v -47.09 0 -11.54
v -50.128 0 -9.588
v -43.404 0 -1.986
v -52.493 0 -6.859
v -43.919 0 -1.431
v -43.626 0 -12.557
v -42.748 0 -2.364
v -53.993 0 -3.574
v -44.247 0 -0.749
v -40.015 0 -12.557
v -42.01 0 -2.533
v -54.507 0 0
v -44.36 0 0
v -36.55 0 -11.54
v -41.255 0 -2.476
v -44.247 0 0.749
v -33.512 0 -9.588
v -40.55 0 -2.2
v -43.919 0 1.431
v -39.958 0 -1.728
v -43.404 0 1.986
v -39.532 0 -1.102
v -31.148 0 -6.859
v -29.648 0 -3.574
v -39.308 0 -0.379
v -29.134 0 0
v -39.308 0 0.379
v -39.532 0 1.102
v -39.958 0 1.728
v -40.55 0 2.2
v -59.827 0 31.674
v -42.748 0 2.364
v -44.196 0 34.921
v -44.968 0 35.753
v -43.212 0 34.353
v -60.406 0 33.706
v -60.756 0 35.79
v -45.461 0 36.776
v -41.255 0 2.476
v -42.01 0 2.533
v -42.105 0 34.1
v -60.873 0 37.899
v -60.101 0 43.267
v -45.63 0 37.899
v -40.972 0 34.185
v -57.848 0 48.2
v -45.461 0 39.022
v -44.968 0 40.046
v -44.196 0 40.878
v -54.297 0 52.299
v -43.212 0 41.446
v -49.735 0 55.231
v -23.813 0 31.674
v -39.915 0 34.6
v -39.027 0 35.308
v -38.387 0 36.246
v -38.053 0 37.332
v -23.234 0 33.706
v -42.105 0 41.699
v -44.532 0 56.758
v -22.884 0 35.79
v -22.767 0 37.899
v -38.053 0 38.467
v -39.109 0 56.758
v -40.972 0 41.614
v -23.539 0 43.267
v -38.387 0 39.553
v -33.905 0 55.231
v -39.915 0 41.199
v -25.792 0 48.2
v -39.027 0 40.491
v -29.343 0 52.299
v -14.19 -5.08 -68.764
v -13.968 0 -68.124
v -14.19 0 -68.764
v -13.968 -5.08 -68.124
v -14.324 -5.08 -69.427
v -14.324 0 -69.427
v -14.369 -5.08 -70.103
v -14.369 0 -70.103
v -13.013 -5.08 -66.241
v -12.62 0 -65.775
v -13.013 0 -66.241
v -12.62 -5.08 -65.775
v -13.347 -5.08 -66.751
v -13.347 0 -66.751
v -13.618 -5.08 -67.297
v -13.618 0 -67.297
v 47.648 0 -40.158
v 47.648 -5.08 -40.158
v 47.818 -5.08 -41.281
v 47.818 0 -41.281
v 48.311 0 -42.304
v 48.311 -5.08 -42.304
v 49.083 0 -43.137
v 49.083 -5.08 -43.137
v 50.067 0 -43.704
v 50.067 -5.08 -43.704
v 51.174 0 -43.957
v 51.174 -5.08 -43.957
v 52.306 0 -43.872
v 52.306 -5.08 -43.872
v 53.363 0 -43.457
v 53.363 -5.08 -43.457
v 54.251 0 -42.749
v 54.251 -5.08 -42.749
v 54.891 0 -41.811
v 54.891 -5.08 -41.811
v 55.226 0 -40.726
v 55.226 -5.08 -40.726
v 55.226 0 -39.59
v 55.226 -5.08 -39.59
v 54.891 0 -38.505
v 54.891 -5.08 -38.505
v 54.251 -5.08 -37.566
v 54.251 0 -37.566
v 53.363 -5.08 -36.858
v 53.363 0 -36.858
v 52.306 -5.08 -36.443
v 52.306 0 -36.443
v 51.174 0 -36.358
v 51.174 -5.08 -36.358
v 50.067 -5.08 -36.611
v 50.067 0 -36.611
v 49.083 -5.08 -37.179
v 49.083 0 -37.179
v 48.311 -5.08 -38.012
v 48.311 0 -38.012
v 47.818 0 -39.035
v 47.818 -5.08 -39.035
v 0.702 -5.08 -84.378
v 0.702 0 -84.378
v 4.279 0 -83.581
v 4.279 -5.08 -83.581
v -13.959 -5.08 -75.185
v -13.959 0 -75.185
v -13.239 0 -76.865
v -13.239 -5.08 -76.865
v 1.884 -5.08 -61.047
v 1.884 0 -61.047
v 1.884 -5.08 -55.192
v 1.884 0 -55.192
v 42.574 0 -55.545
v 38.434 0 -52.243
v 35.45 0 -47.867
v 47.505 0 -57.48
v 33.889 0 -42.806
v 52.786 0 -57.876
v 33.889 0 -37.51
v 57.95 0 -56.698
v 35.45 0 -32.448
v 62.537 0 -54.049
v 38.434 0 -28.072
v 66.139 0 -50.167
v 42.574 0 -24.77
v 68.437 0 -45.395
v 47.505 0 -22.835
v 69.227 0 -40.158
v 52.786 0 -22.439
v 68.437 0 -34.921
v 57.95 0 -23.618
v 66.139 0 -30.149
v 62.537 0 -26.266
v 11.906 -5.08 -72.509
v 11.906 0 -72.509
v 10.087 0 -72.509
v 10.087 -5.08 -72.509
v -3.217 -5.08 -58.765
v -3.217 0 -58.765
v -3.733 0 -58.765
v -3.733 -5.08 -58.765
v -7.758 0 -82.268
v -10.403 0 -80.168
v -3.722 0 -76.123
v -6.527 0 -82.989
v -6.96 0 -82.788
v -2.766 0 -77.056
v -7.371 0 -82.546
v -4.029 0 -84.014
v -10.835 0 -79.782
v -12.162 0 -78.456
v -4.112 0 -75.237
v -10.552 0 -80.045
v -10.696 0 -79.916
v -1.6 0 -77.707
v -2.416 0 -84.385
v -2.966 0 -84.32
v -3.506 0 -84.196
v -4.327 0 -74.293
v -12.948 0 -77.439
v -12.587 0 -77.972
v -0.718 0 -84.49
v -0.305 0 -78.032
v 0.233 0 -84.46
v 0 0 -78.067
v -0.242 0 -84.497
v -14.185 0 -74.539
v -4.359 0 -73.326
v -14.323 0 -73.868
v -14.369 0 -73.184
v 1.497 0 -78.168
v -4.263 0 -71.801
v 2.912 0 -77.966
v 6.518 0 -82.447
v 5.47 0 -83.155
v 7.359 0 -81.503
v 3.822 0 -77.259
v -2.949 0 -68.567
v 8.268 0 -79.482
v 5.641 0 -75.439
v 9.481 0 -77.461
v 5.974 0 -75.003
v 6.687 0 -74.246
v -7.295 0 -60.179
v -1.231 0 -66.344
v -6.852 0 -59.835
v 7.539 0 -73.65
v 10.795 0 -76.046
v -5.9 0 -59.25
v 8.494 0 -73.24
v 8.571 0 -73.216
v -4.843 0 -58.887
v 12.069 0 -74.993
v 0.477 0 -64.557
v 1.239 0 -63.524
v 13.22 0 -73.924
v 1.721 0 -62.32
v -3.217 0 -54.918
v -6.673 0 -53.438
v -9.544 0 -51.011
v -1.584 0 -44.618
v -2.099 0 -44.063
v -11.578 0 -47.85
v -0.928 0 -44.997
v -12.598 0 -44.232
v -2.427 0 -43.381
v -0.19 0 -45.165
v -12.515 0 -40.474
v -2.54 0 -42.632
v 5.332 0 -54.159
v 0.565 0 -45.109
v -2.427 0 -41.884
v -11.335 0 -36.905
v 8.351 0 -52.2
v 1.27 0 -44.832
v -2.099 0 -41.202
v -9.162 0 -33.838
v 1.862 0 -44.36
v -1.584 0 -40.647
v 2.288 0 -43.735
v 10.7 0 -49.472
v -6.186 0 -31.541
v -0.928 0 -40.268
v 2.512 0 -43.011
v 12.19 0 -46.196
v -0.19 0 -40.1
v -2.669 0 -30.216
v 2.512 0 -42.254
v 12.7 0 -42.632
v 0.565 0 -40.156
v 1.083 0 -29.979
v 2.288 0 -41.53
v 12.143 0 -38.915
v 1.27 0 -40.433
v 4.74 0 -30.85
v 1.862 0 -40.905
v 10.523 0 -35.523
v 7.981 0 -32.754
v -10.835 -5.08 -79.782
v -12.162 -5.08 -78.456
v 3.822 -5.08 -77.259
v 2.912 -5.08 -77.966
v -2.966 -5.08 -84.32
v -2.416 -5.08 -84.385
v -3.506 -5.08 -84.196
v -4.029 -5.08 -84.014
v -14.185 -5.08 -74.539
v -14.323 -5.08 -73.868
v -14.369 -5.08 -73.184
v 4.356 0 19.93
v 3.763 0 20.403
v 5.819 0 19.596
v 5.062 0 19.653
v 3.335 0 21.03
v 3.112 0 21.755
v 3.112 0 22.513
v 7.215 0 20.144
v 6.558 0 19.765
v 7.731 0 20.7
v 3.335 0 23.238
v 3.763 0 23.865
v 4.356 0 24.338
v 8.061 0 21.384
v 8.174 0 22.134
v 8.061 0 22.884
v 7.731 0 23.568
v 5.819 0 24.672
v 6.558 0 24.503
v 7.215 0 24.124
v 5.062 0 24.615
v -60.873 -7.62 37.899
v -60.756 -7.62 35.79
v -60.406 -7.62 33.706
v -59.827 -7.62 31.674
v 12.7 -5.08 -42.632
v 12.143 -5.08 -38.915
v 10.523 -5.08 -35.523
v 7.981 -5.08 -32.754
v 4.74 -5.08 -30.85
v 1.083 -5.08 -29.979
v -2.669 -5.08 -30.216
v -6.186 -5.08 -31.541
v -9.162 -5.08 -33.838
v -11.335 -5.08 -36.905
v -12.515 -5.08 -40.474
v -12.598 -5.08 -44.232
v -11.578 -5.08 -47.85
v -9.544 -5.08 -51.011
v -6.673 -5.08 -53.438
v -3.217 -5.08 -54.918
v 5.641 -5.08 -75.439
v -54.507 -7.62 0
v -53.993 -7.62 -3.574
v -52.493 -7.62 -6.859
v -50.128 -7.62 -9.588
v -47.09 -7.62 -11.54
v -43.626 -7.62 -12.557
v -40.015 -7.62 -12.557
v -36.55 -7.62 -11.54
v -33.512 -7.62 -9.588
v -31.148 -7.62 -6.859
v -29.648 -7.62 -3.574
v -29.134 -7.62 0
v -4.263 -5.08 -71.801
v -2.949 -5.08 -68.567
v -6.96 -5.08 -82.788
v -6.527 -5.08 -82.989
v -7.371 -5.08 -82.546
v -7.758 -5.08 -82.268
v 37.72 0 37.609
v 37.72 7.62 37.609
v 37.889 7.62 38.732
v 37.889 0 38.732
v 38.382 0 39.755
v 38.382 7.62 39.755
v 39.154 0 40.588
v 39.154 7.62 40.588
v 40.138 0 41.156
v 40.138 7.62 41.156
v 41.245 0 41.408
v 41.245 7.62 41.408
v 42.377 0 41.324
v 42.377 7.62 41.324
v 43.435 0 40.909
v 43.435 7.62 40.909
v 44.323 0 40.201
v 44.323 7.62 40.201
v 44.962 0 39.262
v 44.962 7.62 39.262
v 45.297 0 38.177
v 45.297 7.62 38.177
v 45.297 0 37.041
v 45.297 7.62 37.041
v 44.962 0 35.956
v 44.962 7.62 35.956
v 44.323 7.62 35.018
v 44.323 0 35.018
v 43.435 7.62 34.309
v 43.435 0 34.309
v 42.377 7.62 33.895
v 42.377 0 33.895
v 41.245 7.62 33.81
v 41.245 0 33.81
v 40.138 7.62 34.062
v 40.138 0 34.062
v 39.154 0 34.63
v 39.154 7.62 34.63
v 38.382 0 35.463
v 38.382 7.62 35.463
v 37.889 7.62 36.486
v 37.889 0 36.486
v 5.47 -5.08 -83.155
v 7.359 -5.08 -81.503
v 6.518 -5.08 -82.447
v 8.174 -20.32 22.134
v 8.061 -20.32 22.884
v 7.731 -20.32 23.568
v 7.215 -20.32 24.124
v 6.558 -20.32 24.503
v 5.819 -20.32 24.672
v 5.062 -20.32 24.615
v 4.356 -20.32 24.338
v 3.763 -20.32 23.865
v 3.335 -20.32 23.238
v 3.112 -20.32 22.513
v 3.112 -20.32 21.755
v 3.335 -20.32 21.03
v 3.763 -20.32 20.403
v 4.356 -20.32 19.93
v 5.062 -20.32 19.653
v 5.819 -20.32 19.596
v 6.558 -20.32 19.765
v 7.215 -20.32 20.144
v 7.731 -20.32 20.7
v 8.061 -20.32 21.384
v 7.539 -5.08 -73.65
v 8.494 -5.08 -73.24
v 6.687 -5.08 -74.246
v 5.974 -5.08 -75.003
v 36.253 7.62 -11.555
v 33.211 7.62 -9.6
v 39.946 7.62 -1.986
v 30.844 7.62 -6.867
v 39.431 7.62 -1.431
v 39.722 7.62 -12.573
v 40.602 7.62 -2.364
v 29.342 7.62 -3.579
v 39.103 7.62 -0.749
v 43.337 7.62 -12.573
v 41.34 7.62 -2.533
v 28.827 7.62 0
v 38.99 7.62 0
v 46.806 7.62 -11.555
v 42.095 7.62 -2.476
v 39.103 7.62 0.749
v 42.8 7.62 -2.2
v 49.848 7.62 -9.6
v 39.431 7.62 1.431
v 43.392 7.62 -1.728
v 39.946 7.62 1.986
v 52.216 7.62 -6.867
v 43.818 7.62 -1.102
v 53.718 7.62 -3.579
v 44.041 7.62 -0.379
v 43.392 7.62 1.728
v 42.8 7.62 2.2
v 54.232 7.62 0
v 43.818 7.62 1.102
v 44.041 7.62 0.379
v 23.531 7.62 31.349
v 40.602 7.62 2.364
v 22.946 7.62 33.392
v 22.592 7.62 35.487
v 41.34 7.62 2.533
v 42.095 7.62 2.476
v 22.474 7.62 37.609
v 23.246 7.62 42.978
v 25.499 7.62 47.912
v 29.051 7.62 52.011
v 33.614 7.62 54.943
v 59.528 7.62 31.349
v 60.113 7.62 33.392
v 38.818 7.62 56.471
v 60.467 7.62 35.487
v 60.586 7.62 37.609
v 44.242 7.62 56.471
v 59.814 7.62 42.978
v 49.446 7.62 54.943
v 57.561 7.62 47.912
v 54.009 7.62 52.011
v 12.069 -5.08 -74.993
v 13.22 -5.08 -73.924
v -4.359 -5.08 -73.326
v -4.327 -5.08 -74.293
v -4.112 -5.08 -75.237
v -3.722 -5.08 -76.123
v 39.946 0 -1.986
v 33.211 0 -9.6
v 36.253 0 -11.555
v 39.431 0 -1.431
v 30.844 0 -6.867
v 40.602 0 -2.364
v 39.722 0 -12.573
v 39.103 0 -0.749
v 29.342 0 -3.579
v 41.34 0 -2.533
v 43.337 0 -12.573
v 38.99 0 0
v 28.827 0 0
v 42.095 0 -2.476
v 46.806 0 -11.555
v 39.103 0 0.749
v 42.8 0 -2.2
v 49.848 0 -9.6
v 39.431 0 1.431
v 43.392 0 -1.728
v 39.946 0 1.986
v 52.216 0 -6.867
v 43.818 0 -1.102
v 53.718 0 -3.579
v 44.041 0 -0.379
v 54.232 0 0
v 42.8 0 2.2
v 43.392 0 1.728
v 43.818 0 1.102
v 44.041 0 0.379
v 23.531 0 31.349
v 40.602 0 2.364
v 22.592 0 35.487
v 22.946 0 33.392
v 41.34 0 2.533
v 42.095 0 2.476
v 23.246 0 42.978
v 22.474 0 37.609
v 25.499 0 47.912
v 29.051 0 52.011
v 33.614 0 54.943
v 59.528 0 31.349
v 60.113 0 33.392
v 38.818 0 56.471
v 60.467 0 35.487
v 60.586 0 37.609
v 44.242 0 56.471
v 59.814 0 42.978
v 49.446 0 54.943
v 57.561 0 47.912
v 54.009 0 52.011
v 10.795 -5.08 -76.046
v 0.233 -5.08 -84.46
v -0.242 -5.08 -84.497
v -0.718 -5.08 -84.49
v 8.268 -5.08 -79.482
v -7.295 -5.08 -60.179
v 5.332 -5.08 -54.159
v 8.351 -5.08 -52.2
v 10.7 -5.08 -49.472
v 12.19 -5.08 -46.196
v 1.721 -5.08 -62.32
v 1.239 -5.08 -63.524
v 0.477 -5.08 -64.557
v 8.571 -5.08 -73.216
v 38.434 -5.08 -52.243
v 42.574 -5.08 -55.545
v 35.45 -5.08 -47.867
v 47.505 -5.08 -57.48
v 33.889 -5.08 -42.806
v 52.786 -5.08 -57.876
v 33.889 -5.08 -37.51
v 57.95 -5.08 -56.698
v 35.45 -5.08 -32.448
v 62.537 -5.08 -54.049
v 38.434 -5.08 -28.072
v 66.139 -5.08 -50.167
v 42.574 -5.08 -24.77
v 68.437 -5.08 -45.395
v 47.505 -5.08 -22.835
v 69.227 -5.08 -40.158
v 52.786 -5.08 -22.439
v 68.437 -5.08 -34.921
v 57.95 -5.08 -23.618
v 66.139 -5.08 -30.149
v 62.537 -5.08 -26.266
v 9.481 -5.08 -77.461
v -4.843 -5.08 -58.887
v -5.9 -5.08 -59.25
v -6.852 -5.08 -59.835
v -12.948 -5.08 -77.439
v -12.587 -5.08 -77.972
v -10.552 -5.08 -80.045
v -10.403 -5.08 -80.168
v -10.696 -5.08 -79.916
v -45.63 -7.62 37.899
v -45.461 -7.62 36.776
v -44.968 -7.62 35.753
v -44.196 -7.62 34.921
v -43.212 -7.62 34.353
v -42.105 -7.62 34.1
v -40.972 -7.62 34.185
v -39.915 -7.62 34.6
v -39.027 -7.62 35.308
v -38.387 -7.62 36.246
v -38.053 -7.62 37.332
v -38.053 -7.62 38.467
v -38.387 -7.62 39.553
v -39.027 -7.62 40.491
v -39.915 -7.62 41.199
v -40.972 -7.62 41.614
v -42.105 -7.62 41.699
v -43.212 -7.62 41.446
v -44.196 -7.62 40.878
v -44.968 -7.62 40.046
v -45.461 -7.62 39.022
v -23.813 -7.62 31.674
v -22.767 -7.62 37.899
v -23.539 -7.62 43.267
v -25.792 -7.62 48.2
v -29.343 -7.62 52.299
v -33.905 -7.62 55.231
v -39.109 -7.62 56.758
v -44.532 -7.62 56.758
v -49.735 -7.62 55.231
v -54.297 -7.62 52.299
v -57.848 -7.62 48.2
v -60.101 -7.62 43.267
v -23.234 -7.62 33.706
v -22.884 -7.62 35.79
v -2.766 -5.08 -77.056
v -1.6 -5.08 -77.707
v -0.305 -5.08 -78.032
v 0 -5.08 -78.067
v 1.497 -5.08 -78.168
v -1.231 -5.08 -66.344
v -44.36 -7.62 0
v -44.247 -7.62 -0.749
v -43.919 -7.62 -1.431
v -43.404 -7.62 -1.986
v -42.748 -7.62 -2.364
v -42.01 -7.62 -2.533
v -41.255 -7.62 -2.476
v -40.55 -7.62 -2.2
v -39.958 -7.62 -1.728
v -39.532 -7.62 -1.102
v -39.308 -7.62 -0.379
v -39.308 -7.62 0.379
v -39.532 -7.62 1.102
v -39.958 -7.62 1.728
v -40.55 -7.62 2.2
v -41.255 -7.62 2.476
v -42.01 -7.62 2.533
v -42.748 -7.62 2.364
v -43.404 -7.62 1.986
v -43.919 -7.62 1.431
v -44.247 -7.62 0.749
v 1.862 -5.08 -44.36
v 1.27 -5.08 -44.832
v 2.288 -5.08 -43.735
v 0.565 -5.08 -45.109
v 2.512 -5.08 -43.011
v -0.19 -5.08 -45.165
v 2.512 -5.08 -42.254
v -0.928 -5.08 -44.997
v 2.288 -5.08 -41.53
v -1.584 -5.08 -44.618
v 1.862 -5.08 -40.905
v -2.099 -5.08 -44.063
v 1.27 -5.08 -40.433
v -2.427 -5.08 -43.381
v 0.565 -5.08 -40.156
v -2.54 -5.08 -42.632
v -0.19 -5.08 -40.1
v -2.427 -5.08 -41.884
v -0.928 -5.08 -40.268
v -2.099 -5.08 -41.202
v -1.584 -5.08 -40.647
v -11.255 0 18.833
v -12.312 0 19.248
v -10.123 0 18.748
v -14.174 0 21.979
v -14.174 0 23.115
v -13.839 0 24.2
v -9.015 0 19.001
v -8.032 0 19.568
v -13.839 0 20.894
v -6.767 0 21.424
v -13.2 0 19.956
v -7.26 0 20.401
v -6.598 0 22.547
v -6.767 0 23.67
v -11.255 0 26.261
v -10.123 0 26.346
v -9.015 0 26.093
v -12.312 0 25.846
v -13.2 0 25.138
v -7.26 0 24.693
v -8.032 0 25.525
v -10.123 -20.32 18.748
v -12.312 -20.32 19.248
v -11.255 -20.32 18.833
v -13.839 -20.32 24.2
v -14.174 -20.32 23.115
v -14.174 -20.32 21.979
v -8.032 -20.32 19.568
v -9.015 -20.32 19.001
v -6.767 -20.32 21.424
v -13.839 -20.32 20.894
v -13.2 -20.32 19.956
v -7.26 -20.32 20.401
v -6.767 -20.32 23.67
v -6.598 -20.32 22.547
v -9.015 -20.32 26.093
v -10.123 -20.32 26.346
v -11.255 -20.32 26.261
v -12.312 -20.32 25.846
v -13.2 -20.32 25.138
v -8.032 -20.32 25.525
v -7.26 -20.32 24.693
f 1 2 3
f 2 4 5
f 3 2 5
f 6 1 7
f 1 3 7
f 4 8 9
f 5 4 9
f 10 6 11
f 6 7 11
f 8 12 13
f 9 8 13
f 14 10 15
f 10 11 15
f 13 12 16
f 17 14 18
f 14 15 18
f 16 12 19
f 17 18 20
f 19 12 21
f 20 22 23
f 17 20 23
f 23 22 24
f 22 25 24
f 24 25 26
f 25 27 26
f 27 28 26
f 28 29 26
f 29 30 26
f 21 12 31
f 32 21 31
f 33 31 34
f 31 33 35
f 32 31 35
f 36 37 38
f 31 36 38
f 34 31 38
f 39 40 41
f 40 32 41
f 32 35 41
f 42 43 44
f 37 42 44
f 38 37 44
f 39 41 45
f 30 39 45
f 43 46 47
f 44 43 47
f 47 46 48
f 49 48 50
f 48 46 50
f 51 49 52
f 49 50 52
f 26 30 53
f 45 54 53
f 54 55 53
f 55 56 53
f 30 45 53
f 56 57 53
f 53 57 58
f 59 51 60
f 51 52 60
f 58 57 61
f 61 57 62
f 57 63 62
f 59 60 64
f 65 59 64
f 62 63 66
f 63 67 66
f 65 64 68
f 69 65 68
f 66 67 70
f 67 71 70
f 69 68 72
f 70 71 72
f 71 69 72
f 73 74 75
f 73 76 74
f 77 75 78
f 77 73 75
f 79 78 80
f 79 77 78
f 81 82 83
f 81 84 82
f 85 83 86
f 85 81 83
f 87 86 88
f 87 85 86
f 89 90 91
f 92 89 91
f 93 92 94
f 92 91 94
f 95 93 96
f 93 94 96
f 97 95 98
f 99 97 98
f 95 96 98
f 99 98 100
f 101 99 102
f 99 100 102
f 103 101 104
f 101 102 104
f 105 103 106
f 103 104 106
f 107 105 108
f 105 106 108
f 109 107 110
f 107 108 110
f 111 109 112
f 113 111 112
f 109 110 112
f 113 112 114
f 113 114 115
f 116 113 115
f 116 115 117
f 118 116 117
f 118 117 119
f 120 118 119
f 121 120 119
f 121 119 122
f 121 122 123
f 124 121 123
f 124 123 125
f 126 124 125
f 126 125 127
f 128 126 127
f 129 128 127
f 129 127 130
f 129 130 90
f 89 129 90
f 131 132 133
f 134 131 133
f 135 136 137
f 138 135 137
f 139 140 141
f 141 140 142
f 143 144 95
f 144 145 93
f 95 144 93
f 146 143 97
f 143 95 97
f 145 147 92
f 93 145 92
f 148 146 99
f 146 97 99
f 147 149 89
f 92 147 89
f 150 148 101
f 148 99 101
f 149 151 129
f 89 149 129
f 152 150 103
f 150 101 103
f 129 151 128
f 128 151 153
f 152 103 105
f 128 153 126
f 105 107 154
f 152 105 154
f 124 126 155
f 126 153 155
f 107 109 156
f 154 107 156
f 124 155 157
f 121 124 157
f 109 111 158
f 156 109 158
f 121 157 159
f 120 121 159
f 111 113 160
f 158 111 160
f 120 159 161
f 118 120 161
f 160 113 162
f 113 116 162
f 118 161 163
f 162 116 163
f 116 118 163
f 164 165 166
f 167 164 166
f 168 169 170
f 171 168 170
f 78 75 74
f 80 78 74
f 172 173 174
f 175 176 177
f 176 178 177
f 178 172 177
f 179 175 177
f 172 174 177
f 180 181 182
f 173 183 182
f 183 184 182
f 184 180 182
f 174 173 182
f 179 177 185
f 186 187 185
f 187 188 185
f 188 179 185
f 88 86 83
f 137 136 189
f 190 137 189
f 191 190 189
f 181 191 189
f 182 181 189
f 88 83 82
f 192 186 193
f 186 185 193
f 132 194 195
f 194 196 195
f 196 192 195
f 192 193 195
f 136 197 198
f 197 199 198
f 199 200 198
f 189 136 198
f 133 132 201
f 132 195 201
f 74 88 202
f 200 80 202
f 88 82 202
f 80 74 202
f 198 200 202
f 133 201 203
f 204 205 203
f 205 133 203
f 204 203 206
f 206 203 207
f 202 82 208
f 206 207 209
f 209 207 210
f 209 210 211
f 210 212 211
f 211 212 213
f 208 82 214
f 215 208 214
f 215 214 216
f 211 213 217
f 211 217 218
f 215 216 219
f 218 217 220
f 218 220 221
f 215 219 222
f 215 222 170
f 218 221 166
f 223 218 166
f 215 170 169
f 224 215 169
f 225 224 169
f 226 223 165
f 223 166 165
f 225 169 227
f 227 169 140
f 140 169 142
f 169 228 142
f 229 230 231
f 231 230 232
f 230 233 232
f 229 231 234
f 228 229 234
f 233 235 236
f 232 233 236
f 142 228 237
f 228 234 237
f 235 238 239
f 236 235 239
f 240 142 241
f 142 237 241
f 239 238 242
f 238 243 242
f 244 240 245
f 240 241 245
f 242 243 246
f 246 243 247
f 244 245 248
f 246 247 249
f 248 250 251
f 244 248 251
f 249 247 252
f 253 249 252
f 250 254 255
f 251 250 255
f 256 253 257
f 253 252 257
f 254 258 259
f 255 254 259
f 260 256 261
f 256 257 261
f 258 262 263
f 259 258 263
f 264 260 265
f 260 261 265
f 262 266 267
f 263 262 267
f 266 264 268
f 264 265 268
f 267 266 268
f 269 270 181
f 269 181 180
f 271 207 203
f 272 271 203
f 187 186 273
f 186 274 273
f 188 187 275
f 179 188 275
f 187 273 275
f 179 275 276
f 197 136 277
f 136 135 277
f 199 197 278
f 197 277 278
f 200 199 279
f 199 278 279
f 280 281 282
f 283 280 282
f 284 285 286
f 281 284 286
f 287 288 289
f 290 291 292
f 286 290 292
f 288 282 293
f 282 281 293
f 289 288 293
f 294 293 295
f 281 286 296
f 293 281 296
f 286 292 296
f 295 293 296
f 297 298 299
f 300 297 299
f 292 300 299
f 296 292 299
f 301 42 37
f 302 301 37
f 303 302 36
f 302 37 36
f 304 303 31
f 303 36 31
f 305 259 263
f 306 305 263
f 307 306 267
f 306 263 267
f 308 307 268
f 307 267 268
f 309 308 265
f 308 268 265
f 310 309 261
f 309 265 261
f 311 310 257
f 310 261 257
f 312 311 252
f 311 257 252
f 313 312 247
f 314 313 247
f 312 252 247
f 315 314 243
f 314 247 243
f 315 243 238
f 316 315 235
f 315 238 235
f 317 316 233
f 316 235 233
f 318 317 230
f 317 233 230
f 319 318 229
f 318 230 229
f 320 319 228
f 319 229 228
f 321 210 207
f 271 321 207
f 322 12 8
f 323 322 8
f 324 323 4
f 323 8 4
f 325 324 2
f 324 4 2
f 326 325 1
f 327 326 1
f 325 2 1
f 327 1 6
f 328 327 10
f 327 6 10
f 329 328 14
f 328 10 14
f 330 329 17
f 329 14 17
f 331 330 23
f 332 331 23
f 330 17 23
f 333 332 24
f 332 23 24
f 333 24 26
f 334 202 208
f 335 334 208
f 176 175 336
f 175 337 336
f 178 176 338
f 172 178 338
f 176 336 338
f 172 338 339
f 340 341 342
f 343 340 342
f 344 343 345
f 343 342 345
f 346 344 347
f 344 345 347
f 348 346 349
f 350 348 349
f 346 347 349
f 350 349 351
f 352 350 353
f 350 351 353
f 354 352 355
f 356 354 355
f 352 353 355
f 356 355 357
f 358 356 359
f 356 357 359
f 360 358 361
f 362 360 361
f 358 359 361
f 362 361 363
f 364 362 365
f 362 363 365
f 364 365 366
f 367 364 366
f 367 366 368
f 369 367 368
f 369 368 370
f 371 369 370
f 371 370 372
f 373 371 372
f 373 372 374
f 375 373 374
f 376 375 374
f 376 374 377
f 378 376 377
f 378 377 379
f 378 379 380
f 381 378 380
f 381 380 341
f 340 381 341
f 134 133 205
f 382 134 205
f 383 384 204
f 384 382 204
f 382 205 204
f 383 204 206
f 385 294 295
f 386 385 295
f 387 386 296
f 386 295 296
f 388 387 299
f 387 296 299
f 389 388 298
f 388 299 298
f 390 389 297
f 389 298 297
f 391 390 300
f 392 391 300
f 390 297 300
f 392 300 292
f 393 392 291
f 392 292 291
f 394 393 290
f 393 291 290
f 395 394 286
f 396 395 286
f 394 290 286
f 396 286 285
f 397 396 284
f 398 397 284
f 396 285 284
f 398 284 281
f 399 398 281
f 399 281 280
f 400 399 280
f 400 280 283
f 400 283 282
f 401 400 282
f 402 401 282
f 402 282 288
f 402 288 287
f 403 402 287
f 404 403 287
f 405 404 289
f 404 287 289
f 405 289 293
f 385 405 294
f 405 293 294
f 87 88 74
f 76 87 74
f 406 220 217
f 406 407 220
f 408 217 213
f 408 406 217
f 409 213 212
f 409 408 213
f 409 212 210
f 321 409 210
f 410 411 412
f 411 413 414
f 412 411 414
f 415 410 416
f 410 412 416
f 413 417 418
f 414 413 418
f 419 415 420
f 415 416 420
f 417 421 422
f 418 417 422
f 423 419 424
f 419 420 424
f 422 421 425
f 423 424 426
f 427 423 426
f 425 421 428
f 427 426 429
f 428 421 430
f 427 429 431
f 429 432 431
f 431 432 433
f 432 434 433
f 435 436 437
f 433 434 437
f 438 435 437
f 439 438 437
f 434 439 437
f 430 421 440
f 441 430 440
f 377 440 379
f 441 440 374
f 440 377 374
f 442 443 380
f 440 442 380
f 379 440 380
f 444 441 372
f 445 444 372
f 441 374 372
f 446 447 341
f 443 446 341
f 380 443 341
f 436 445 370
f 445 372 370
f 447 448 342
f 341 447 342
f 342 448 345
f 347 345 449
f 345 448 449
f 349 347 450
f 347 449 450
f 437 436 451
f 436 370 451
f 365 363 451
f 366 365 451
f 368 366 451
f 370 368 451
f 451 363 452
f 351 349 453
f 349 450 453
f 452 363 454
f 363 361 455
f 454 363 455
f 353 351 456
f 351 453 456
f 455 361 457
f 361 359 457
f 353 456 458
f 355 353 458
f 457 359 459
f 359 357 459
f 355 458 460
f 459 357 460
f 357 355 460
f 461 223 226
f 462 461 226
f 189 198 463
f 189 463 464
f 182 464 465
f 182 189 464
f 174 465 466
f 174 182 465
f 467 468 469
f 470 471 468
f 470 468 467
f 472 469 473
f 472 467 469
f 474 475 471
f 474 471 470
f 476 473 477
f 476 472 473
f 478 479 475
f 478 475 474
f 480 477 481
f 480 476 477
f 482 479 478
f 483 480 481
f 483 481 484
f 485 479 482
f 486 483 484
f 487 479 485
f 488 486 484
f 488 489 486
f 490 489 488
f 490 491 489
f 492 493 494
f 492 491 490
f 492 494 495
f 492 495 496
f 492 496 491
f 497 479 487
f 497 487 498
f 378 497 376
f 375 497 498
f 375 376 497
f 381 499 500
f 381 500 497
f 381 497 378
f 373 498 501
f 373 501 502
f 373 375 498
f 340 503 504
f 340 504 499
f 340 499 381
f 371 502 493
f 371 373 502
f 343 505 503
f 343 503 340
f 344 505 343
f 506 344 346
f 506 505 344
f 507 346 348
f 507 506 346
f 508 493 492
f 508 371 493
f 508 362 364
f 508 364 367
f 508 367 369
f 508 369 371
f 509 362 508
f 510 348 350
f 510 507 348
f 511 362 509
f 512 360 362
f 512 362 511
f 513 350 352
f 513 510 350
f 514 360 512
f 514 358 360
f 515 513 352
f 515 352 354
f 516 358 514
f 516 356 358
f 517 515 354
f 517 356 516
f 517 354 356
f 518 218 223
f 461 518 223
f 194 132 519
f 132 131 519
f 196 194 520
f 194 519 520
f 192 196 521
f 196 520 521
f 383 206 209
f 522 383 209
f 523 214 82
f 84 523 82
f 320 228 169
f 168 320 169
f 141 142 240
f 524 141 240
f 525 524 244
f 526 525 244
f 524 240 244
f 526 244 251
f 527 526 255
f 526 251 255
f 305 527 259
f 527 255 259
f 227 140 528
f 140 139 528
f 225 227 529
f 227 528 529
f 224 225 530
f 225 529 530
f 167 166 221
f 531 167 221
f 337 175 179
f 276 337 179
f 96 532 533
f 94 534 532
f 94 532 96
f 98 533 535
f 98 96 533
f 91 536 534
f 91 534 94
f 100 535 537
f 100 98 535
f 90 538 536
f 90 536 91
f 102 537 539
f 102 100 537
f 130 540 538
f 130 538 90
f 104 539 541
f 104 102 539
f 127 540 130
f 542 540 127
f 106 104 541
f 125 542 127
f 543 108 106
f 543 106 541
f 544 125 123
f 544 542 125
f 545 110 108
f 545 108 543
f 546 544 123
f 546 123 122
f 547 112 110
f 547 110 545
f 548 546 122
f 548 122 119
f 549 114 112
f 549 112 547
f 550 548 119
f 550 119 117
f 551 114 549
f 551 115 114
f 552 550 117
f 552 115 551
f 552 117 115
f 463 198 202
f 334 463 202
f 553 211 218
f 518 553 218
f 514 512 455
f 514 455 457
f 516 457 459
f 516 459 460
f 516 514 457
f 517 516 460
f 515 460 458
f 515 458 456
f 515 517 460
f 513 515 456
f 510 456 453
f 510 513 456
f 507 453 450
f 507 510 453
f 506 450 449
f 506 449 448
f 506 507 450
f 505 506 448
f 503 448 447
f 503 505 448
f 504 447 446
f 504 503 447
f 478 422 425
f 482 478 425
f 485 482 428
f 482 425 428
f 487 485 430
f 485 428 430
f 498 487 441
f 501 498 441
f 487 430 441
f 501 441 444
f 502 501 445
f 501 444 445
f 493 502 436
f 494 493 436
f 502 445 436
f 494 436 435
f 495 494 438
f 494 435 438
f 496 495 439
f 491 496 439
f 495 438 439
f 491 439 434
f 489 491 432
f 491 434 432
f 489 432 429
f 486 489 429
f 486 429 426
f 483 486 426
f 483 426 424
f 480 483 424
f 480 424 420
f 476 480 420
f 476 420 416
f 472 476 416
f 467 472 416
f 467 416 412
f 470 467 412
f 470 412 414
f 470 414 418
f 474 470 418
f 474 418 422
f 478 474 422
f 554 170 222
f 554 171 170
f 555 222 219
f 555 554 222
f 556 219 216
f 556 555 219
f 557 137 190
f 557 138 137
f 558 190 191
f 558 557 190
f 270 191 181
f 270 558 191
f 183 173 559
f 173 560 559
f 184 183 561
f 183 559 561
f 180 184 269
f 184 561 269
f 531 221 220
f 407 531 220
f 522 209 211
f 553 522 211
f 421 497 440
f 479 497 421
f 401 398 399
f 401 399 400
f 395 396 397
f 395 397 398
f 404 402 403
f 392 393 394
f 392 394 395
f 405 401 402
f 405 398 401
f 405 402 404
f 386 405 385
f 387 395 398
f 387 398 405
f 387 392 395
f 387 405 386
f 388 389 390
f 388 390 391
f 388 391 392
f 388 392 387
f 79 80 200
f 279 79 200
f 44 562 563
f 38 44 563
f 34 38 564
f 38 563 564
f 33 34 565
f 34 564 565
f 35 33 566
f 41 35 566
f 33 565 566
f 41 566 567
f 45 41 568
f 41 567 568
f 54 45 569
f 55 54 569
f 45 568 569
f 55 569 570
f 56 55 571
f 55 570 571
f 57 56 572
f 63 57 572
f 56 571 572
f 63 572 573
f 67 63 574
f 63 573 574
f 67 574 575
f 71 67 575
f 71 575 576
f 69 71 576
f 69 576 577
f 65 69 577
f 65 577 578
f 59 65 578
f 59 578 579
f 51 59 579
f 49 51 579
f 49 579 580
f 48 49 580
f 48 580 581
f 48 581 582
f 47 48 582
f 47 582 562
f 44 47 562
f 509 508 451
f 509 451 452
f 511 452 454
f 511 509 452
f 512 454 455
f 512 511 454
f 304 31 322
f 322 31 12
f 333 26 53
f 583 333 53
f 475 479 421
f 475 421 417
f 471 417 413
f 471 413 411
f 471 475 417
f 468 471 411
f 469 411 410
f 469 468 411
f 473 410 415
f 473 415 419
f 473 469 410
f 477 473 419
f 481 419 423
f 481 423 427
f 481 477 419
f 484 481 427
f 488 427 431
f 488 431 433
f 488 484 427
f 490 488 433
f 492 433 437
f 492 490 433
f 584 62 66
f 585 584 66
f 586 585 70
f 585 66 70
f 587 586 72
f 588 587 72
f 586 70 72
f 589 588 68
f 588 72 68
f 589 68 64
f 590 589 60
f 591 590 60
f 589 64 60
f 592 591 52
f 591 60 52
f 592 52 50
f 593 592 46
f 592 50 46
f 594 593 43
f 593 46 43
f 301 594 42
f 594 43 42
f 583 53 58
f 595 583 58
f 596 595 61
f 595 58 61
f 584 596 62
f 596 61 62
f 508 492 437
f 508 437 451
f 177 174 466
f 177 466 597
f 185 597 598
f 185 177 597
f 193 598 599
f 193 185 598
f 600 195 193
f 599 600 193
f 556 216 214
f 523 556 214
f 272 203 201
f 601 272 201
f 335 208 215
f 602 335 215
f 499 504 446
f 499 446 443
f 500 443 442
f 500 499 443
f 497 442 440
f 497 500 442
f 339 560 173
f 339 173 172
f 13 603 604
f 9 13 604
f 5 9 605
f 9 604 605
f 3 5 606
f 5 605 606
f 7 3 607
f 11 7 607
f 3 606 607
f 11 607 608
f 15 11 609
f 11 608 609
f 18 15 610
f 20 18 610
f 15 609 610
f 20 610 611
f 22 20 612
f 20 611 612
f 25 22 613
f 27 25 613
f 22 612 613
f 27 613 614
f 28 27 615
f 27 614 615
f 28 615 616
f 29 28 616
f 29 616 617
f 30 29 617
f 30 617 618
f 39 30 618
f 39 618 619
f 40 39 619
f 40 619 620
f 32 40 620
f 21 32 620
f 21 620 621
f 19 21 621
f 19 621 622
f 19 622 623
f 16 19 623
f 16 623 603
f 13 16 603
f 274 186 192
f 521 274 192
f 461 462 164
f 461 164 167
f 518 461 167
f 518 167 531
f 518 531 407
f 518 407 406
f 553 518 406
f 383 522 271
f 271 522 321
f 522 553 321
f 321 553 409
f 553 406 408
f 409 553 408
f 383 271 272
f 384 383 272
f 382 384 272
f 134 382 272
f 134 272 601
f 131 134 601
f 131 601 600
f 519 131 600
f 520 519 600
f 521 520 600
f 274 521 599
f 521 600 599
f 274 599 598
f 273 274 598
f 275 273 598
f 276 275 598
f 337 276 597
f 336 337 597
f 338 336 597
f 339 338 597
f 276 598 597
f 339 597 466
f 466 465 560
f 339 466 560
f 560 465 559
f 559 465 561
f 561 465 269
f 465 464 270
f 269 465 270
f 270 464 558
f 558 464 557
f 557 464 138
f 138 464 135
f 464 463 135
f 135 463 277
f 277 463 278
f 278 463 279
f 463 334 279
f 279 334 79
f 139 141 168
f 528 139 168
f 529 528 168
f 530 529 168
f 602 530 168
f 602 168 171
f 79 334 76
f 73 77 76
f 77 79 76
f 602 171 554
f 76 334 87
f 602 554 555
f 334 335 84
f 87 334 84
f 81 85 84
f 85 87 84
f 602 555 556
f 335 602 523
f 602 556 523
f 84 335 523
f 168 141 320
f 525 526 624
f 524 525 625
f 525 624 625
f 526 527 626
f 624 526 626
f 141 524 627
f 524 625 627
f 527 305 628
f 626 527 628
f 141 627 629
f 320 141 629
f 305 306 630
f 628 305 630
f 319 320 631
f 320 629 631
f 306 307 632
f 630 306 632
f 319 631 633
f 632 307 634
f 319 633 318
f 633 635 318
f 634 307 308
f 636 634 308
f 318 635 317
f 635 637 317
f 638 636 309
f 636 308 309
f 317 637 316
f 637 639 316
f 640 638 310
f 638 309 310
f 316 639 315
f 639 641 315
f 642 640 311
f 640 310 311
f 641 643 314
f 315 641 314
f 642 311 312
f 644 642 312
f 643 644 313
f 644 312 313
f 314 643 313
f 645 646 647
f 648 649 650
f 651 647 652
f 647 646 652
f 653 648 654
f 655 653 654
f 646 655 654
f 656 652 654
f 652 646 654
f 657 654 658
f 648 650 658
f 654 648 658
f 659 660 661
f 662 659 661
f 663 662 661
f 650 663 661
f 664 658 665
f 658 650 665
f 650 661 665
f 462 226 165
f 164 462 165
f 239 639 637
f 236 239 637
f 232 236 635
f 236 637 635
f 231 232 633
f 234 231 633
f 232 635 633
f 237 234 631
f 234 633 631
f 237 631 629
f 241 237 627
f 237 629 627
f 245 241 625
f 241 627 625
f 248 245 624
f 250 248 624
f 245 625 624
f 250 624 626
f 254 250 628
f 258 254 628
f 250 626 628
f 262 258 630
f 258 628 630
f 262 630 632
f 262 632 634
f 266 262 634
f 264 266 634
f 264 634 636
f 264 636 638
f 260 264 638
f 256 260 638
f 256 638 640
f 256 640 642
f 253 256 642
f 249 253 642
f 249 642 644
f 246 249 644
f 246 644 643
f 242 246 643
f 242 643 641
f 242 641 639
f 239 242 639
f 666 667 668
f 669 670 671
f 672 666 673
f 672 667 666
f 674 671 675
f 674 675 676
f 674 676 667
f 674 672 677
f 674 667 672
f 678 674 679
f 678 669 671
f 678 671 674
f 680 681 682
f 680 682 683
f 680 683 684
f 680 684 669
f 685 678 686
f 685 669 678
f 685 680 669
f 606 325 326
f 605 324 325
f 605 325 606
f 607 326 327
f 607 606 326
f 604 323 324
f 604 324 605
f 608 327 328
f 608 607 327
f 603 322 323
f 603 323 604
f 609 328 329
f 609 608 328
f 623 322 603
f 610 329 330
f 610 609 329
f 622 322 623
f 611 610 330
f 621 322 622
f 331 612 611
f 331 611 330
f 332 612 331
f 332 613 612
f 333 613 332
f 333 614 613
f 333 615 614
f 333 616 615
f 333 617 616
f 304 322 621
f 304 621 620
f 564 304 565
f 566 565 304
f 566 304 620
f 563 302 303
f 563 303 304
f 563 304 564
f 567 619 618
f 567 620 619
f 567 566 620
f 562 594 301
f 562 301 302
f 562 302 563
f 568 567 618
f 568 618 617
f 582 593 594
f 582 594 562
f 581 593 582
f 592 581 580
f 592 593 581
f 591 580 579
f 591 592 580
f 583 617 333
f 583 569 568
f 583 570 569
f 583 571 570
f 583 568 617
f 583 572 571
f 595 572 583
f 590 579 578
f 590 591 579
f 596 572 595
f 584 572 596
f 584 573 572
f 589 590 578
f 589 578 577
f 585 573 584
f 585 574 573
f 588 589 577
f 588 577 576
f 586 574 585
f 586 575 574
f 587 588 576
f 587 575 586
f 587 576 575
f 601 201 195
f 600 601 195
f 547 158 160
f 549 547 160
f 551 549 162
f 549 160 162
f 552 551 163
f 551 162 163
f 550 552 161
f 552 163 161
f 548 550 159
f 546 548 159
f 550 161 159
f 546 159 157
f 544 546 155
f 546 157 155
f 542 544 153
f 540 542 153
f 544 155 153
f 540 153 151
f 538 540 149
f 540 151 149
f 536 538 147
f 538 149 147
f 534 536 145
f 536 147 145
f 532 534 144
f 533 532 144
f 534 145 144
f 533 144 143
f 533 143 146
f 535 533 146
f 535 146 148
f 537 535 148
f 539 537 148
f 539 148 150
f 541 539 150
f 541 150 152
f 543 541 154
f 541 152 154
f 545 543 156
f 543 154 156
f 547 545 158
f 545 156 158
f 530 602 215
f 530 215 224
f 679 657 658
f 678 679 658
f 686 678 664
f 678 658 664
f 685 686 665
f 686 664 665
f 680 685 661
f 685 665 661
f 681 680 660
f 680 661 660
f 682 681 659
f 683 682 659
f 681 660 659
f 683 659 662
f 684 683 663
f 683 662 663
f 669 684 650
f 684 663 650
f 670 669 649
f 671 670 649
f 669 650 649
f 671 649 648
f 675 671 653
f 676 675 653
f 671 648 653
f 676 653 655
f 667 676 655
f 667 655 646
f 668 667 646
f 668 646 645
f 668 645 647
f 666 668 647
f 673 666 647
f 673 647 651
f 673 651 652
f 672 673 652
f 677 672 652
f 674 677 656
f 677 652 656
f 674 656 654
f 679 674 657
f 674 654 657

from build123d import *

# Parameters (mm, degrees)
F1_DEPTH     = 7.62
F2_D         = 5.08
F4_DEPTH     = 7.62
F5_D         = 7.62
F6_D         = 7.62
F7_D         = 5.08
F9_DEPTH     = 5.08
F10_T1_DEPTH = 15.6779412076
F11_R        = 5.08
F12_R        = 5.08
F13_R        = 5.08
F14_T1_DEPTH = 5.08
F14_F3_R     = 5.08
F15_R        = 5.08
F16_D        = 5.08
F17_R        = 17.7680692018
F18_DEPTH    = 5.08
F19_D        = 7.62
F20_R        = 3.8094085712
F21_DEPTH    = 20.32
F20_R_2      = 2.5450619433


# Not quite as in the source:
# - a fillet or chamfer that OpenCascade refuses, or shapes differently, is made with other operations: its cross-section is extruded or revolved along the edge and cut away or added


with BuildPart() as f1:
    # F0 (on Front) → F1 (new body)
    with BuildSketch(Plane.XZ):
        with BuildLine():
            Line((-23.8130350034, 31.6741682533), (-22.7673095988, 37.8994755447))
            ThreePointArc((-22.7673095988, 37.8994755447), (-41.8201088905, 56.9522748364), (-60.8729081823, 37.8994755447))
            Line((-60.8729081823, 37.8994755447), (-59.8271827777, 31.6741682533))
            ThreePointArc((-59.8271827777, 31.6741682533), (-41.8201088905, 18.846676253), (-23.8130350034, 31.6741682533))
        make_face()
        with BuildLine():
            ThreePointArc((-23.8130350034, 31.6741682533), (-23.0305595951, 34.7432122281), (-22.7673095988, 37.8994755447))
            Line((-22.7673095988, 37.8994755447), (-23.8130350034, 31.6741682533))
        make_face()
        with BuildLine():
            Line((-59.8271827777, 31.6741682533), (-60.8729081823, 37.8994755447))
            ThreePointArc((-60.8729081823, 37.8994755447), (-60.609658186, 34.7432122281), (-59.8271827777, 31.6741682533))
        make_face()
        with BuildLine():
            Line((-29.1336530644, 0), (-23.8130350034, 31.6741682533))
            ThreePointArc((-23.8130350034, 31.6741682533), (-41.8201088905, 18.846676253), (-59.8271827777, 31.6741682533))
            Line((-59.8271827777, 31.6741682533), (-54.5065647167, 0))
            ThreePointArc((-54.5065647167, 0), (-41.8201088905, 12.6864558261), (-29.1336530644, 0))
        make_face()
        with BuildLine():
            ThreePointArc((-54.5065647167, 0), (-41.8201088905, -12.6864558261), (-29.1336530644, 0))
            ThreePointArc((-29.1336530644, 0), (-41.8201088905, 12.6864558261), (-54.5065647167, 0))
        make_face()
    extrude(amount=F1_DEPTH)

    # F2 (through all)
    with Locations(Plane(origin=(0, 0, 0), x_dir=(1, 0, 0), z_dir=(0, 1, 0))):
        with Locations((-41.8201088905, 0)):
            Hole(F2_D / 2)

    # F5 (through all)
    with Locations(Plane(origin=(0, 0, 0), x_dir=(1, 0, 0), z_dir=(0, 1, 0))):
        with Locations((-41.8201088905, -37.8994755447)):
            Hole(F5_D / 2)


with BuildPart() as f4:
    # F3 (on Front) → F4 (new body)
    with BuildSketch(Plane.XZ):
        with BuildLine():
            Line((59.5282177794, 31.3490809442), (60.5857727855, 37.6090556383))
            ThreePointArc((60.5857727855, 37.6090556383), (41.5296927094, 56.6651357143), (22.4736126334, 37.6090556383))
            Line((22.4736126334, 37.6090556383), (23.5311676395, 31.3490809442))
            ThreePointArc((23.5311676395, 31.3490809442), (41.5296927094, 18.5529755623), (59.5282177794, 31.3490809442))
        make_face()
        with BuildLine():
            ThreePointArc((59.5282177794, 31.3490809442), (60.3195240398, 34.4347168977), (60.5857727855, 37.6090556383))
            Line((60.5857727855, 37.6090556383), (59.5282177794, 31.3490809442))
        make_face()
        with BuildLine():
            Line((23.5311676395, 31.3490809442), (22.4736126334, 37.6090556383))
            ThreePointArc((22.4736126334, 37.6090556383), (22.7398613791, 34.4347168977), (23.5311676395, 31.3490809442))
        make_face()
        with BuildLine():
            Line((54.2321296786, 0), (59.5282177794, 31.3490809442))
            ThreePointArc((59.5282177794, 31.3490809442), (41.5296927094, 18.5529755623), (23.5311676395, 31.3490809442))
            Line((23.5311676395, 31.3490809442), (28.8272557403, 0))
            ThreePointArc((28.8272557403, 0), (41.5296927094, 12.7024369691), (54.2321296786, 0))
        make_face()
        with BuildLine():
            ThreePointArc((28.8272557403, 0), (41.5296927094, -12.7024369691), (54.2321296786, 0))
            ThreePointArc((54.2321296786, 0), (41.5296927094, 12.7024369691), (28.8272557403, 0))
        make_face()
    extrude(amount=-F4_DEPTH)

    # F6 (through all)
    with Locations(Plane.XZ):
        with Locations((41.5296927094, 37.6090556383)):
            Hole(F6_D / 2)

    # F7 (through all)
    with Locations(Plane.XZ):
        with Locations((41.5296927094, 0)):
            Hole(F7_D / 2)


with BuildPart() as f9:
    # F8 (on Front) → F9 (new body)
    with BuildSketch(Plane.XZ):
        with BuildLine():
            ThreePointArc((1.8835700949, -55.1916896292), (9.6229496478, -50.9198456578), (12.699669381, -42.6324792206))
            ThreePointArc((12.699669381, -42.6324792206), (-7.7595267274, -32.5790545626), (-3.2174926052, -54.9178096486))
            ThreePointArc((-3.2174926052, -54.9178096486), (-0.6808743473, -55.3138834217), (1.8835700949, -55.1916896292))
        make_face()
        with BuildLine():
            ThreePointArc((1.8835700949, -55.1916896292), (-0.6808743473, -55.3138834217), (-3.2174926052, -54.9178096486))
            Line((-3.2174926052, -54.9178096486), (-3.2174926052, -58.7645881589))
            Line((-3.2174926052, -58.7645881589), (-5.4759941995, -58.7645881589))
            Line((-5.4759941995, -58.7645881589), (-7.29507301, -60.1794272661))
            Line((-7.29507301, -60.1794272661), (-13.2576106116, -66.4451420307))
            Line((-13.2576106116, -66.4451420307), (-14.369269833, -69.0727010369))
            Line((-14.369269833, -69.0727010369), (-14.369269833, -71.5992003679))
            Line((-14.369269833, -71.5992003679), (-14.369269833, -74.2267593741))
            Line((-14.369269833, -74.2267593741), (-12.8533700481, -77.7638554573))
            Line((-12.8533700481, -77.7638554573), (-10.6300516054, -79.9871757627))
            Line((-10.6300516054, -79.9871757627), (-7.1940133348, -82.7157944441))
            Line((-7.1940133348, -82.7157944441), (-3.2526752912, -84.3327566981))
            Line((-3.2526752912, -84.3327566981), (0, -84.5348760486))
            Line((0, -84.5348760486), (6.3480199315, -83.120033145))
            Line((6.3480199315, -83.120033145), (7.3586194776, -81.5030783415))
            Line((7.3586194776, -81.5030783415), (8.2681588829, -79.4818773866))
            Line((8.2681588829, -79.4818773866), (9.4808777794, -77.4606764317))
            Line((9.4808777794, -77.4606764317), (10.7946563512, -76.0458409786))
            Line((10.7946563512, -76.0458409786), (12.0688441613, -74.9925974282))
            Line((12.0688441613, -74.9925974282), (13.2200969383, -73.9235803485))
            Line((13.2200969383, -73.9235803485), (11.9063183665, -72.5087374449))
            Line((11.9063183665, -72.5087374449), (10.0872376934, -72.5087374449))
            Line((10.0872376934, -72.5087374449), (8.5713388398, -73.216162622))
            Line((8.5713388398, -73.216162622), (6.9543798454, -73.7214609981))
            Line((6.9543798454, -73.7214609981), (5.640600808, -75.4394754767))
            Line((5.640600808, -75.4394754767), (3.8215208333, -77.2585570812))
            Line((3.8215208333, -77.2585570812), (2.9119816609, -77.9659748077))
            Line((2.9119816609, -77.9659748077), (1.497142599, -78.1680941582))
            Line((1.497142599, -78.1680941582), (0, -78.067034483))
            Line((0, -78.067034483), (-2.6463153772, -77.7638554573))
            Line((-2.6463153772, -77.7638554573), (-4.4653946534, -75.0352367759))
            Line((-4.4653946534, -75.0352367759), (-4.2632748373, -71.8013197184))
            Line((-4.2632748373, -71.8013197184), (-2.949495567, -68.5674026608))
            Line((-2.949495567, -68.5674026608), (-1.2314763153, -66.3440823555))
            Line((-1.2314763153, -66.3440823555), (0.8931973609, -64.120400207))
            Line((0.8931973609, -64.120400207), (1.8835700949, -62.9080462995))
            Line((1.8835700949, -62.9080462995), (1.8835700949, -61.3925094736))
            Line((1.8835700949, -61.3925094736), (1.8835700949, -59.169189184))
            Line((1.8835700949, -59.169189184), (1.8835700949, -55.1916896292))
        make_face()
    extrude(amount=F9_DEPTH)

    # F10: fillet of radius 5.08 on 1 edges, made by hand

    # F10_s2 → F10_t1 (cut)
    with BuildSketch(Plane.XZ.offset(-5.2989706038)):
        with BuildLine():
            ThreePointArc((4.2791936374, -83.5811319179), (6.0156790125, -82.833698277), (7.3586194776, -81.5030783415))
            Line((7.3586194776, -81.5030783415), (6.3480199315, -83.120033145))
            Line((6.3480199315, -83.120033145), (4.2791936374, -83.5811319179))
        make_face()
    extrude(amount=F10_T1_DEPTH, mode=Mode.SUBTRACT)

    # F11
    f11_edges = [f9.edges().sort_by_distance(p)[0] for p in [
        (-3.252675, -2.54, -84.332757),
        (-7.194013, -2.54, -82.715794),
        (-10.630052, -2.54, -79.987176),
        (0, -2.54, -84.534876),
    ]]
    fillet(f11_edges, radius=F11_R)

    # F12
    f12_edges = [f9.edges().sort_by_distance(p)[0] for p in [
        (6.95438, -2.54, -73.721461),
    ]]
    fillet(f12_edges, radius=F12_R)

    # F13
    f13_edges = [f9.edges().sort_by_distance(p)[0] for p in [
        (-14.36927, -2.54, -74.226759),
        (-5.475994, -2.54, -58.764588),
    ]]
    fillet(f13_edges, radius=F13_R)

    # F14: fillet of radius 5.08 on 3 edges, made by hand

    # F14_s2 → F14_t1 (join)
    with BuildSketch(Plane.XZ):
        with BuildLine():
            ThreePointArc((-4.3585477158, -73.3256857753), (-4.1940364205, -74.9622378117), (-3.5152560014, -76.4604446322))
            Line((-3.5152560014, -76.4604446322), (-3.5997923091, -76.5168021755))
            Line((-3.5997923091, -76.5168021755), (-4.5689337341, -75.063090162))
            Line((-4.5689337341, -75.063090162), (-4.4599498578, -73.3193481414))
            Line((-4.4599498578, -73.3193481414), (-4.3585477158, -73.3256857753))
        make_face()
        with BuildLine():
            ThreePointArc((-3.9535608414, -75.8029874283), (-2.3752000359, -77.3200945031), (-0.3049608466, -78.0320961936))
            Line((-0.3049608466, -78.0320961936), (-0.3165251543, -78.1330359122))
            Line((-0.3165251543, -78.1330359122), (-2.7047067756, -77.8594303612))
            Line((-2.7047067756, -77.8594303612), (-4.0380971491, -75.8593449716))
            Line((-4.0380971491, -75.8593449716), (-3.9535608414, -75.8029874283))
        make_face()
    extrude(amount=F14_T1_DEPTH)

    # F14_f3
    f14_f3_edges = [f9.edges().sort_by_distance(p)[0] for p in [
        (1.8835700949, -2.54, -62.9080462995),
    ]]
    fillet(f14_f3_edges, radius=F14_F3_R)

    # F15
    f15_edges = [f9.edges().sort_by_distance(p)[0] for p in [
        (-13.257611, -2.54, -66.445142),
        (-14.36927, -2.54, -69.072701),
        (-12.85337, -2.54, -77.763855),
    ]]
    fillet(f15_edges, radius=F15_R)

    # F16 (through all)
    with Locations(Plane(origin=(0, 0, 0), x_dir=(1, 0, 0), z_dir=(0, 1, 0))):
        with Locations((0, 42.6324792206)):
            Hole(F16_D / 2)


with BuildPart() as f18:
    # F17 (on Front) → F18 (new body)
    with BuildSketch(Plane.XZ):
        with Locations((51.4584966004, -40.1577576995)):
            Circle(F17_R)
    extrude(amount=F18_DEPTH)

    # F19 (through all)
    with Locations(Plane(origin=(0, 0, 0), x_dir=(1, 0, 0), z_dir=(0, 1, 0))):
        with Locations((51.4584966004, 40.1577576995)):
            Hole(F19_D / 2)


with BuildPart() as f21:
    # F20 (on Front) → F21 (new body)
    with BuildSketch(Plane.XZ):
        with Locations((-10.4072010145, 22.5467532873)):
            Circle(F20_R)
    extrude(amount=F21_DEPTH)


with BuildPart() as f21b:
    # F20 (on Front) → F21, piece 2 (new body)
    with BuildSketch(Plane.XZ):
        with Locations((5.6285150349, 22.1340265125)):
            Circle(F20_R_2)
    extrude(amount=F21_DEPTH)


solid = Compound([f1.part, f4.part, f9.part, f18.part, f21.part, f21b.part])
